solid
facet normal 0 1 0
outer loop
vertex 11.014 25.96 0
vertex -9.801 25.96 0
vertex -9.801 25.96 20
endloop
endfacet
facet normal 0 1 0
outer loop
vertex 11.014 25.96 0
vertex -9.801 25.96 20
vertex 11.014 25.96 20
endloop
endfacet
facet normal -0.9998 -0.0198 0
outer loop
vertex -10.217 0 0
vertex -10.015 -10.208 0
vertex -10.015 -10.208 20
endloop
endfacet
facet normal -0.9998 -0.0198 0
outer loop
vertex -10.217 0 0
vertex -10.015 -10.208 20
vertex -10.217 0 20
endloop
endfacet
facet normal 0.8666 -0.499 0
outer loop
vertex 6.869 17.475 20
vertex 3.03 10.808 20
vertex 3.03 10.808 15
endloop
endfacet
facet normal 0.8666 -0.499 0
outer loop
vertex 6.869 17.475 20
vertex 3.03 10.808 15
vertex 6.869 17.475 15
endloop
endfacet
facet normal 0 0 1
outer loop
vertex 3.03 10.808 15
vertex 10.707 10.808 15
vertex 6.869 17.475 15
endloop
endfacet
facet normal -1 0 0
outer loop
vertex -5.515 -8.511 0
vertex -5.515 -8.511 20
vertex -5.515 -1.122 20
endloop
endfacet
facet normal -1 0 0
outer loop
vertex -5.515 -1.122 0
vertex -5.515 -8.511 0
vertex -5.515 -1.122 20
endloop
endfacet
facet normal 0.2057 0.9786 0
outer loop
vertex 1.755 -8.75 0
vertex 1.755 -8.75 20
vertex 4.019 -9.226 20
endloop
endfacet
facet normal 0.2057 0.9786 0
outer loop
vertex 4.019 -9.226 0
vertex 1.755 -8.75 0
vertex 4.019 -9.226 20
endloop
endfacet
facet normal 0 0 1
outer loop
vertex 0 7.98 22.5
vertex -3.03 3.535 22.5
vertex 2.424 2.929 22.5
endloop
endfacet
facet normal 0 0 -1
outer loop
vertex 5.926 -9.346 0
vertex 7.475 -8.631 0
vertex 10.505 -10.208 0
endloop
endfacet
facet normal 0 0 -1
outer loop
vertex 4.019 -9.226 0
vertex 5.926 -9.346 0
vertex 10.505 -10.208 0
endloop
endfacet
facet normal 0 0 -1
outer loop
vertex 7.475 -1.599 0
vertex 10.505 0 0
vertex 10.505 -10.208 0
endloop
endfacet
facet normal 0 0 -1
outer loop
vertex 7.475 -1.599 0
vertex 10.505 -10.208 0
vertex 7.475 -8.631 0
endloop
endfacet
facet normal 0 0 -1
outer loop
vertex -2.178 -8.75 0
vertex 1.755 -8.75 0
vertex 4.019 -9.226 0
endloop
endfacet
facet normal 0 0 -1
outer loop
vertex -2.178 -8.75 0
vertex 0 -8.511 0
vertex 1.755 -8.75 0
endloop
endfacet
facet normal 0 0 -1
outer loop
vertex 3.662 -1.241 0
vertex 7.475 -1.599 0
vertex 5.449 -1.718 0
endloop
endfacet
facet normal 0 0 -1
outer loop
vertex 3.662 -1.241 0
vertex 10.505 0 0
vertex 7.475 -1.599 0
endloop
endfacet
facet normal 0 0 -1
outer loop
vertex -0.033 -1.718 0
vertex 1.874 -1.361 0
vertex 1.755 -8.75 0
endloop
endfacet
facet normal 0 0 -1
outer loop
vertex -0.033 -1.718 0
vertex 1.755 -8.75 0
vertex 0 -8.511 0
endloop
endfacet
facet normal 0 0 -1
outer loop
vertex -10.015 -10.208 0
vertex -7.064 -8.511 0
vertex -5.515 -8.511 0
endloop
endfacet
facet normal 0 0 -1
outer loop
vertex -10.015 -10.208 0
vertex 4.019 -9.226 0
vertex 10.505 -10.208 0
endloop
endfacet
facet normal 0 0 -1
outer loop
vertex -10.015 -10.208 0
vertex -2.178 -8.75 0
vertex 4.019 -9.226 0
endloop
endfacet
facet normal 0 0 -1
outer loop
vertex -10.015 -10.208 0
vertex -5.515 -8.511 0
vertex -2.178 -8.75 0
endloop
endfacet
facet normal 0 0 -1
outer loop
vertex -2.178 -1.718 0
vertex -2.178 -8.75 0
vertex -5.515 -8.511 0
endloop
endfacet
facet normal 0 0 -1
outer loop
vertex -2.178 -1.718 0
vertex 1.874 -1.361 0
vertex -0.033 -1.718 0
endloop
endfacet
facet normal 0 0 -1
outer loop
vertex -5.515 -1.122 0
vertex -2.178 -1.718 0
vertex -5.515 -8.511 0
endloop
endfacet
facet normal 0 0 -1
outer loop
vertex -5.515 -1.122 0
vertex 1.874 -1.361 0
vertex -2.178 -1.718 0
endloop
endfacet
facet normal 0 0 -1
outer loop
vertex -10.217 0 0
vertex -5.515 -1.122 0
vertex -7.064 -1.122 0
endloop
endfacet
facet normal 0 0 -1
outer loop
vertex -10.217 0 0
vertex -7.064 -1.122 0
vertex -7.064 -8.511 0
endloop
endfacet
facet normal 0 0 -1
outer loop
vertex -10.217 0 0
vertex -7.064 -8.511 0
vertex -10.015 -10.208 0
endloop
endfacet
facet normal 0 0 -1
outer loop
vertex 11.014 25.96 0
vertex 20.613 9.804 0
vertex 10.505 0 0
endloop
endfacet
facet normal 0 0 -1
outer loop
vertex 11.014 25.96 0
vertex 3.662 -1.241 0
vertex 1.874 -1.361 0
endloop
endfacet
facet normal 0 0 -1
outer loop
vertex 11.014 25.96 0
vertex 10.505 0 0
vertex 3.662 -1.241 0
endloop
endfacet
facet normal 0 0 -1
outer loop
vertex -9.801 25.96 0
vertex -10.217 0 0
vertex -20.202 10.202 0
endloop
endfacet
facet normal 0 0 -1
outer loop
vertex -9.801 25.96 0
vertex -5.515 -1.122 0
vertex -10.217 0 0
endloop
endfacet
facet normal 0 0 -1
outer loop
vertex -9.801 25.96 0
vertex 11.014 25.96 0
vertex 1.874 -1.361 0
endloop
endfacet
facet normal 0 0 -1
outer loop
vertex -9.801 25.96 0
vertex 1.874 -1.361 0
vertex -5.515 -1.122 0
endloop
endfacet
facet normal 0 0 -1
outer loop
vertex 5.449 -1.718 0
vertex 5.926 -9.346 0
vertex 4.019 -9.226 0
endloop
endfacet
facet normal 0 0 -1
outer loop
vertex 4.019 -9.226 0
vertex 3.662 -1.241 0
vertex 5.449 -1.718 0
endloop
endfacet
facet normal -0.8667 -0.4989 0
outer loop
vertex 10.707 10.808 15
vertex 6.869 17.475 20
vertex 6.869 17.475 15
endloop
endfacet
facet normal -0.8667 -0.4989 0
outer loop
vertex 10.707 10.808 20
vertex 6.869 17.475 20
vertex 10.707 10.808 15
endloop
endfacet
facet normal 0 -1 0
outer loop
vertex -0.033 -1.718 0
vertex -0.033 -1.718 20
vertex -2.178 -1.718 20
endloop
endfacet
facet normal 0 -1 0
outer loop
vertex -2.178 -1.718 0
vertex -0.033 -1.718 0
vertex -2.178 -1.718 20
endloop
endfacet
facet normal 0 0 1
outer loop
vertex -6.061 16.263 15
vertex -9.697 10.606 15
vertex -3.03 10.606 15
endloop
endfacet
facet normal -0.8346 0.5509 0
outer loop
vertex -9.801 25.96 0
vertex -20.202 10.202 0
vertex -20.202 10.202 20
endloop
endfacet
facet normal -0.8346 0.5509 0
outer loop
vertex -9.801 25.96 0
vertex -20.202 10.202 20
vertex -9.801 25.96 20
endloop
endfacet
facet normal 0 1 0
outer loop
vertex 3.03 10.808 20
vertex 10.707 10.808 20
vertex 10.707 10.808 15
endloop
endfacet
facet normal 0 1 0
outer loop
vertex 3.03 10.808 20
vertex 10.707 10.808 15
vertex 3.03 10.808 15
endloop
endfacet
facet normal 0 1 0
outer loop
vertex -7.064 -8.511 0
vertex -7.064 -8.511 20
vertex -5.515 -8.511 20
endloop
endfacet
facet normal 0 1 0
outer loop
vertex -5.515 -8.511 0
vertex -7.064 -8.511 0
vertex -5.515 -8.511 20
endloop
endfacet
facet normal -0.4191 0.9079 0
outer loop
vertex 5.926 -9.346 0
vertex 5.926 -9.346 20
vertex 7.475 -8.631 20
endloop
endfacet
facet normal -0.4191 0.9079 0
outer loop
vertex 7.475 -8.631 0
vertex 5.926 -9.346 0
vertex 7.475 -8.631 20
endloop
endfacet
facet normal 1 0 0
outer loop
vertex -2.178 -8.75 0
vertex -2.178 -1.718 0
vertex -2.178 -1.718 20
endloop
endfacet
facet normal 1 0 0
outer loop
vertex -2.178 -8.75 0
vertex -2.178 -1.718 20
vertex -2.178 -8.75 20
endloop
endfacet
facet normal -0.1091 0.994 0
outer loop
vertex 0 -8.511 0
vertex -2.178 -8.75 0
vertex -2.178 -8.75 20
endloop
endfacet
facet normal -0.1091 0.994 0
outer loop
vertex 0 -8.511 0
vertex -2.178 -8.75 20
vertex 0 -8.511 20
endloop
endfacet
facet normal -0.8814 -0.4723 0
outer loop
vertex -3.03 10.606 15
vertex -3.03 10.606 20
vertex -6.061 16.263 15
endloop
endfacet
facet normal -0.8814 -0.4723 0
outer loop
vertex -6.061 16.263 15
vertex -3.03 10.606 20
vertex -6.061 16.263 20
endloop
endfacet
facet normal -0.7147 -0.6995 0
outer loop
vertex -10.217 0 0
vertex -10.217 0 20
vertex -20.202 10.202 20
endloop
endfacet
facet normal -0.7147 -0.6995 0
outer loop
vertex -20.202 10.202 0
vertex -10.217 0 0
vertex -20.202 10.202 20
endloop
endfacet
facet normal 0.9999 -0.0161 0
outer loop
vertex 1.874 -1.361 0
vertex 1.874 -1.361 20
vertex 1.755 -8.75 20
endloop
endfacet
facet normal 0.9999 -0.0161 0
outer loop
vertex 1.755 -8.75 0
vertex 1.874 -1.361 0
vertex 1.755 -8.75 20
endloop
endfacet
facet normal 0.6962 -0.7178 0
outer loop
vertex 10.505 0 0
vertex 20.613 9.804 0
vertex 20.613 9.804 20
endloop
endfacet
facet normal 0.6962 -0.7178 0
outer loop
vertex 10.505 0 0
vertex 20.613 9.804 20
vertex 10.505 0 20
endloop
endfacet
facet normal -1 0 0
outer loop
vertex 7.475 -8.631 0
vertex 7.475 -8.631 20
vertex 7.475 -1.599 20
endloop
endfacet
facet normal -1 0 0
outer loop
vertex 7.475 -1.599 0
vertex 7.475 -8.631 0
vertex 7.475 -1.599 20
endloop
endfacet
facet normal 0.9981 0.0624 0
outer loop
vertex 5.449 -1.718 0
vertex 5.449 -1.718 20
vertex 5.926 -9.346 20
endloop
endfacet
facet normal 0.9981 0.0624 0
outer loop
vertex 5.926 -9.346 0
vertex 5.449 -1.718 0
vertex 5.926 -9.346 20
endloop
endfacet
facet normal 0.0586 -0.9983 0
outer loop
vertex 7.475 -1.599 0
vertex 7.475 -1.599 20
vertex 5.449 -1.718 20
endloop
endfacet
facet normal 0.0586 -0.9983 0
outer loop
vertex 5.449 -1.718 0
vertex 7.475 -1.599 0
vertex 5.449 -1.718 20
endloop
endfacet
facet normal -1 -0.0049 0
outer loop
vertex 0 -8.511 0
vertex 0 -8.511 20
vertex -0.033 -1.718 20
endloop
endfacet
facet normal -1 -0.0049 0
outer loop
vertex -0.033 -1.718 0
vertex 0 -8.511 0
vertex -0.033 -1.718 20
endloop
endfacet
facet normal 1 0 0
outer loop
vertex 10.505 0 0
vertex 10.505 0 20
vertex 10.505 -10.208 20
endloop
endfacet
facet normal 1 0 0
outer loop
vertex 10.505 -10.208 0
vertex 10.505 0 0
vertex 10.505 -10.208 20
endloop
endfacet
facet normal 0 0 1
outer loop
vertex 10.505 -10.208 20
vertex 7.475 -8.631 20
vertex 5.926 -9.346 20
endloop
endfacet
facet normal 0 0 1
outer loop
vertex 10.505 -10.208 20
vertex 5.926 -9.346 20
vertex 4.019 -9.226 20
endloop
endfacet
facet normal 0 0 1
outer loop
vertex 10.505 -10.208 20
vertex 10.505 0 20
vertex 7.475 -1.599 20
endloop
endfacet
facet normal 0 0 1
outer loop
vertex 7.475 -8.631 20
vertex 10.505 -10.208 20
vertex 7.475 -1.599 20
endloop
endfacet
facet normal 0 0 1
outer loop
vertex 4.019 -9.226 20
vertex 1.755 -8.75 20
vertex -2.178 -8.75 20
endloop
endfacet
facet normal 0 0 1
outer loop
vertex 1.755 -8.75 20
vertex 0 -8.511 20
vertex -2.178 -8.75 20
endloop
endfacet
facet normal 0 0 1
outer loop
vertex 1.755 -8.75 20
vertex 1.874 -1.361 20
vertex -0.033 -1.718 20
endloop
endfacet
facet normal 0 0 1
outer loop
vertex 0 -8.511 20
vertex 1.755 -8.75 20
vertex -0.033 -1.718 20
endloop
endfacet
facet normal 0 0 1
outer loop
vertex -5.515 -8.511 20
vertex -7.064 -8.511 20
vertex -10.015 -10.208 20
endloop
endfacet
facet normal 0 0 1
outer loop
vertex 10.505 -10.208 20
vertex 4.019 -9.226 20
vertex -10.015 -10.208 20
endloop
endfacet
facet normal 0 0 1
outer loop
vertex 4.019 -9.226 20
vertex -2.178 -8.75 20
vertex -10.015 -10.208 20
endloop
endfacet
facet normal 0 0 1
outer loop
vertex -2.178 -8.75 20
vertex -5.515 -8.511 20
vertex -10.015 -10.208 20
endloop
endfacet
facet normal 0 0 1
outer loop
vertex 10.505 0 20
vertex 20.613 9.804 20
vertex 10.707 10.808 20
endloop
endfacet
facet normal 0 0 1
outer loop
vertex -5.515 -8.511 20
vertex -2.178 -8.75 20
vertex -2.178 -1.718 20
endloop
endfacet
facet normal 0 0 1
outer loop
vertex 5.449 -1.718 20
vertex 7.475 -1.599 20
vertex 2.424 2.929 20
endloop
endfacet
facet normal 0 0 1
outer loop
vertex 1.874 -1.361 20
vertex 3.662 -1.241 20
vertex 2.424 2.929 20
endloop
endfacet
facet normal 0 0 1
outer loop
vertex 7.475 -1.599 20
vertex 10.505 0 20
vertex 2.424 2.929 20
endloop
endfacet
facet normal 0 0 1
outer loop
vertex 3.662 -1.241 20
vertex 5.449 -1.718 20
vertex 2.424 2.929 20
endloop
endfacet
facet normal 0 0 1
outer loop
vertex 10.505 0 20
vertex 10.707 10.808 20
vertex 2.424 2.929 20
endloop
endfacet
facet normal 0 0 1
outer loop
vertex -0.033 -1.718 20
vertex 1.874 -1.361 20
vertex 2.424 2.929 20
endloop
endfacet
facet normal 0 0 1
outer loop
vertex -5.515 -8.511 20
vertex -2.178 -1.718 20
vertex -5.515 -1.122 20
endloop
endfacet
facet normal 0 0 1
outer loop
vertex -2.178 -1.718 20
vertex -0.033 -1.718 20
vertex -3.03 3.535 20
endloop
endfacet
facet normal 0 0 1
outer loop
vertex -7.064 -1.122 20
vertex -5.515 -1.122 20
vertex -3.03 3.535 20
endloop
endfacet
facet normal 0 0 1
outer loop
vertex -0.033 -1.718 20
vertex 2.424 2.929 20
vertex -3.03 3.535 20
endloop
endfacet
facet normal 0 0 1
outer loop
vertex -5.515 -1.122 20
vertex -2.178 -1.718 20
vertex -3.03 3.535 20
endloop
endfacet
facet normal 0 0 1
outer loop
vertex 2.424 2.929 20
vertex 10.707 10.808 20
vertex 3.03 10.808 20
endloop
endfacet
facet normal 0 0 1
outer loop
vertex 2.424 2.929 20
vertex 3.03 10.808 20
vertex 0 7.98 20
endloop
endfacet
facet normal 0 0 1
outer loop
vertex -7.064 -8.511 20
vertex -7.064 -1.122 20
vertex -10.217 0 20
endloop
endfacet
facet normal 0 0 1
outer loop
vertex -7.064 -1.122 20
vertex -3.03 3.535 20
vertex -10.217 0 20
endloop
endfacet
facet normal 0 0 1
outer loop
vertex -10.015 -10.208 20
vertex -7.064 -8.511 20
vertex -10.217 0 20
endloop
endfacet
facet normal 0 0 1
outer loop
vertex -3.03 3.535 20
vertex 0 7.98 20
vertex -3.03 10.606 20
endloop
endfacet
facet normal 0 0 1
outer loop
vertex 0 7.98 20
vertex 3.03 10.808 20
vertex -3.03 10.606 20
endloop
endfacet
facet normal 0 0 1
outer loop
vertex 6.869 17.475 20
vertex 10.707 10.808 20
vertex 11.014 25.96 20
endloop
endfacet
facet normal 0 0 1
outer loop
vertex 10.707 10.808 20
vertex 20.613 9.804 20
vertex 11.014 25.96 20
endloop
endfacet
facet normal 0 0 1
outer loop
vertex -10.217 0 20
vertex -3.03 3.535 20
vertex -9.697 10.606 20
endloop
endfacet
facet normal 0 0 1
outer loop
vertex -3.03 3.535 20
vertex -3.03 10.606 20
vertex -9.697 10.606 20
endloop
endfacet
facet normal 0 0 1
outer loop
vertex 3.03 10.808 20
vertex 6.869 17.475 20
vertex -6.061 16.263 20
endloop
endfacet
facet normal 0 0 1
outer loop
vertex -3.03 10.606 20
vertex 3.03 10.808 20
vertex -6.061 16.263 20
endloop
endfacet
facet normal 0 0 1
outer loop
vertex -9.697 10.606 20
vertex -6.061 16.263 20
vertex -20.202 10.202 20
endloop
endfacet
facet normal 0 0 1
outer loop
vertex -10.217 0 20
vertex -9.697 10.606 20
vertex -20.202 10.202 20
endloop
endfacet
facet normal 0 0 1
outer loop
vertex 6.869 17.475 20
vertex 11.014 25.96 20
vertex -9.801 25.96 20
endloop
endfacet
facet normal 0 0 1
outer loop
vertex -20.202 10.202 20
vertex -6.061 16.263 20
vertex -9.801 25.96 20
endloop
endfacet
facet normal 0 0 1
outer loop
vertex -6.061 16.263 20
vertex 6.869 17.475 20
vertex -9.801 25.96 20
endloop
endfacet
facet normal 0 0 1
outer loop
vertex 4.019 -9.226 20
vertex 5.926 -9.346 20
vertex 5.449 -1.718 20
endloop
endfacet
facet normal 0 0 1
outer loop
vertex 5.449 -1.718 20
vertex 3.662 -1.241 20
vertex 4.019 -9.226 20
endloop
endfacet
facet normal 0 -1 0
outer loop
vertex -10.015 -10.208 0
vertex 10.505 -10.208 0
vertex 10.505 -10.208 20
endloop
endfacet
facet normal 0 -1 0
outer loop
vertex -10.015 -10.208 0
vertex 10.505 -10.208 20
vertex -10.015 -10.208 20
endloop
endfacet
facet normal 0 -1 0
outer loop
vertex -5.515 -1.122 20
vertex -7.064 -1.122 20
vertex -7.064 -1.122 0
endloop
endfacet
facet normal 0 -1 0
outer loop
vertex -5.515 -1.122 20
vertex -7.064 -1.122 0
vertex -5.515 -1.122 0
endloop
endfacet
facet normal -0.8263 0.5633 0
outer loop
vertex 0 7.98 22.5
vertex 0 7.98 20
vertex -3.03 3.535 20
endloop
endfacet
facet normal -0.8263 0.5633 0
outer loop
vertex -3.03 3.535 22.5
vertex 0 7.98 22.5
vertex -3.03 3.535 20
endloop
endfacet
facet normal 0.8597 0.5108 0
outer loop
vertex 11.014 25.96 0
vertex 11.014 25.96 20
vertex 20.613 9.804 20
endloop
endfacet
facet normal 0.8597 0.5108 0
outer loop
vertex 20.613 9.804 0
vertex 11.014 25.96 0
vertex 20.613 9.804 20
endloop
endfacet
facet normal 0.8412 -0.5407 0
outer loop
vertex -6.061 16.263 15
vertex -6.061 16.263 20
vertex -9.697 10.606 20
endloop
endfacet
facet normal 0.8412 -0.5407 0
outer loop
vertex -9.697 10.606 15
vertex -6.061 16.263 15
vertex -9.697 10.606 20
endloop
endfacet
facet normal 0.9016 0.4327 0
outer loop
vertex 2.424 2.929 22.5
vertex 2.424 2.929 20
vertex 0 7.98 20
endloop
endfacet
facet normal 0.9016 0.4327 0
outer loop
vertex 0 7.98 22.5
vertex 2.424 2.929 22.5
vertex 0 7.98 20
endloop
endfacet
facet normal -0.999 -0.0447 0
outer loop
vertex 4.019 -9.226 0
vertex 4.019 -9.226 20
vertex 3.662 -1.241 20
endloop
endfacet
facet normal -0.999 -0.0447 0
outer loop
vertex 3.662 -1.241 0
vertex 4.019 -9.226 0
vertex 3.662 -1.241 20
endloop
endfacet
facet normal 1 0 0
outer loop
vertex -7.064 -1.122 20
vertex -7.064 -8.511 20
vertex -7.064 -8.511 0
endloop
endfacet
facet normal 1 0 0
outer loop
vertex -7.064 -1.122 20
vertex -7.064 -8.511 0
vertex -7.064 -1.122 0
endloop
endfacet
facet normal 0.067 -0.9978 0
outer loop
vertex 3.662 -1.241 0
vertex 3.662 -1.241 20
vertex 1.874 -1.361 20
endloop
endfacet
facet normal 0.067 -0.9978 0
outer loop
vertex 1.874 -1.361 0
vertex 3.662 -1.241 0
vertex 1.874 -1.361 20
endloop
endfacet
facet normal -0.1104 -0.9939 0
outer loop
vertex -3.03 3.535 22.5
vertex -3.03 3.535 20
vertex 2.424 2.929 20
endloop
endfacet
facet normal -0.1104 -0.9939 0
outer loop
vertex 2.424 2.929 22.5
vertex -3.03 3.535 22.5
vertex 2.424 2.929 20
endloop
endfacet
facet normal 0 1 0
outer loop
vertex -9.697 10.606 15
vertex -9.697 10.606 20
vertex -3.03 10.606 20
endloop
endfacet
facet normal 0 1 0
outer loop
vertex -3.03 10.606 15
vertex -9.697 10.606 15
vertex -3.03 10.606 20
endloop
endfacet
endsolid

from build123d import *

# Parameters (mm, degrees)
PAD_DEPTH       = 20
POCKET_DEPTH    = 5
POCKET001_DEPTH = 5
PAD001_DEPTH    = 2.5
SKETCH004_W     = 1.549321
SKETCH004_H     = 7.389076
POCKET002_DEPTH = 20.001
POCKET003_DEPTH = 20.001
POCKET004_DEPTH = 20.001
POCKET005_DEPTH = 20.001


with BuildPart() as part:
    # Sketch → Pad (new body)
    with BuildSketch(Plane.XY):
        Polygon((-9.801471, 25.959593), (11.01361, 25.959593), (20.613062, 9.803649), (10.505054, 0), (10.505054, -10.208122), (-10.014578, -10.208122), (-10.216599, 0), (-20.202017, 10.202021), align=None)
    extrude(amount=PAD_DEPTH)

    # Sketch002 (on Face10 of Pad) → Pocket (cut)
    with BuildSketch(Plane.XY.offset(20)):
        Polygon((10.707072, 10.808081), (3.03031, 10.808081), (6.868694, 17.474747), align=None)
    extrude(amount=-POCKET_DEPTH, mode=Mode.SUBTRACT)

    # Sketch001 (on Face10 of Pad) → Pocket001 (cut)
    with BuildSketch(Plane.XY.offset(20)):
        Polygon((-6.060602, 16.262627), (-9.696968, 10.606062), (-3.030296, 10.606062), align=None)
    extrude(amount=-POCKET001_DEPTH, mode=Mode.SUBTRACT)

    # Sketch003 (on Face5 of Pocket001) → Pad001 (join)
    with BuildSketch(Plane.XY.offset(20)):
        Polygon((0, 7.979798), (-3.030296, 3.535354), (2.424244, 2.929294), align=None)
    extrude(amount=PAD001_DEPTH)

    # Sketch004 (on Face5 of Pad001) → Pocket002 (cut, through all)
    with BuildSketch(Plane.XY.offset(20)):
        with Locations((-6.289715, -4.81679)):
            Rectangle(SKETCH004_W, SKETCH004_H)
    extrude(amount=-POCKET002_DEPTH, mode=Mode.SUBTRACT)

    # Sketch005 (on Face5 of Pocket002) → Pocket003 (cut, through all)
    with BuildSketch(Plane.XY.offset(20)):
        Polygon((-2.178051, -1.718145), (-2.178051, -8.749685), (0, -8.511328), (-0.032834, -1.718145), align=None)
    extrude(amount=-POCKET003_DEPTH, mode=Mode.SUBTRACT)

    # Sketch006 (on Face5 of Pocket003) → Pocket004 (cut, through all)
    with BuildSketch(Plane.XY.offset(20)):
        Polygon((1.874023, -1.36061), (1.754846, -8.749685), (4.019244, -9.226399), (3.661705, -1.241431), align=None)
    extrude(amount=-POCKET004_DEPTH, mode=Mode.SUBTRACT)

    # Sketch007 (on Face5 of Pocket004) → Pocket005 (cut, through all)
    with BuildSketch(Plane.XY.offset(20)):
        Polygon((5.449386, -1.718145), (5.926099, -9.345578), (7.475415, -8.630507), (7.475415, -1.598966), align=None)
    extrude(amount=-POCKET005_DEPTH, mode=Mode.SUBTRACT)


solid = part.part
